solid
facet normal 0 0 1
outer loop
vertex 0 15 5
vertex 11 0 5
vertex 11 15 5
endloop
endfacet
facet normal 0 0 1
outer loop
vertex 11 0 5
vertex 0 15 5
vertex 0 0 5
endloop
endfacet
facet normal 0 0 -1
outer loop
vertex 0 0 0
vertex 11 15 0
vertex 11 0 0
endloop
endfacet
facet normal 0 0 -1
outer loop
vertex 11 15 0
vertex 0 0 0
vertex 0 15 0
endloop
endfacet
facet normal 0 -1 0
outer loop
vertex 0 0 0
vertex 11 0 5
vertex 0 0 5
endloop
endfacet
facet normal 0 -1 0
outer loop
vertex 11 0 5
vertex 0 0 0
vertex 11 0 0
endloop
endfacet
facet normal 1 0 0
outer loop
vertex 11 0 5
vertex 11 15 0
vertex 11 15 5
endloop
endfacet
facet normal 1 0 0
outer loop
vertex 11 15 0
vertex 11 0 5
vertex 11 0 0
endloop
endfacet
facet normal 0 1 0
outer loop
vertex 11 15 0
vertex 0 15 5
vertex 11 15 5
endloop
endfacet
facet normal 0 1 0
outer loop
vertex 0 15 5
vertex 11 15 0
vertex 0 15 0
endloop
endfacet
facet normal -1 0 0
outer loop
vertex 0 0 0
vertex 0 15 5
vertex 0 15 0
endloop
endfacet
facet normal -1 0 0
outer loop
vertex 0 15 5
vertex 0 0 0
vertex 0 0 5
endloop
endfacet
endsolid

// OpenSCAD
// Generated by SolidPython 1.0.1 on 2020-07-29 00:46:55


cube(size = [11, 15, 5]);
/***********************************************
*********      SolidPython code:      **********
************************************************
 
# import packages: SolidPython
from solid import *
from solid.utils import *
from itertools import chain, combinations, permutations


class Resize:

    def __init__(self, scad_file):
        self.scad_file = scad_file
        #self.scad_file = import_scad(scad_file)
        # cone/cylinder param:
        self.r1 = 0
        self.r2 = 0
        self.h = 0
        # rectangular prism param:
        self.w = 0
        self.l = 0
        # ellipse param:
        self.r = 0

    # import OpenScad code (file name corresponds to shape)


    # classify shape + parameters
    def assign(self, param1, param2, param3):
        if self.scad_file == 'cone.scad':
            self.r1 = param1
            self.r2 = param2
            self.h = param3
        elif self.scad_file == 'cylinder.scad':
            self.r1 = param1
            self.r2 = param2
            self.h = param3
        elif self.scad_file == 'rectangularPrism.scad':
            self.h = param1
            self.l = param2
            self.w = param3
        else:
            self.r = param1
            self.h = param2

    # resize parameters
    def iterate(self):
        x = range(3, 20, 2)
        i = 1
        if self.scad_file == 'cone.scad':
            tempList = list(permutations(x, 2))
            for temp in tempList:
                param1 = temp[0]
                param2 = temp[1]
                filepath = 'produced_scad_files/' + 'cone' + str(param1) + '_' + str(param2) + '_' + '.scad'
                scad_render_to_file(cylinder(h=param1, r1=param2, r2=0), filepath)

        elif self.scad_file == 'cylinder.scad':
            tempList = list(permutations(x, 3))
            for temp in tempList:
                param1 = temp[0]
                param2 = temp[1]
                filepath = 'produced_scad_files/' + 'cylinder' + str(param1) + '_' + str(param2) + '_' + '.scad'
                scad_render_to_file(cylinder(h=param1, r1=param2, r2=param2), filepath)

        elif self.scad_file == 'rectangularPrism.scad':
            tempList = list(permutations(x, 3))
            for temp in tempList:
                param1 = temp[0]
                param2 = temp[1]
                param3 = temp[2]
                filepath = 'produced_scad_files/' + 'rectangularPrism' + str(param1) + '_' + str(param2) + '_' + str(
                    param3) + '.scad'
                scad_render_to_file(cube(size=(param1, param2, param3)), filepath)

        elif self.scad_file == 'ellipse.scad':
            tempList = list(permutations(x, 4))
            for temp in tempList:
                param1 = temp[0]
                param2 = temp[1]
                param3 = temp[2]
                param4 = temp[3]
                filepath = 'produced_scad_files/' + 'ellipse' + str(param1) + '_' + str(param2) + '_' + str(param3) + '_' + str(param4) + '.scad'
                scad_render_to_file(scale([param1, param2, param3])(sphere(r=param4)), filepath)

    def render_to_scadfile(self):
        scad_render_to_file(scad, 'example.scad') 
 
************************************************/
